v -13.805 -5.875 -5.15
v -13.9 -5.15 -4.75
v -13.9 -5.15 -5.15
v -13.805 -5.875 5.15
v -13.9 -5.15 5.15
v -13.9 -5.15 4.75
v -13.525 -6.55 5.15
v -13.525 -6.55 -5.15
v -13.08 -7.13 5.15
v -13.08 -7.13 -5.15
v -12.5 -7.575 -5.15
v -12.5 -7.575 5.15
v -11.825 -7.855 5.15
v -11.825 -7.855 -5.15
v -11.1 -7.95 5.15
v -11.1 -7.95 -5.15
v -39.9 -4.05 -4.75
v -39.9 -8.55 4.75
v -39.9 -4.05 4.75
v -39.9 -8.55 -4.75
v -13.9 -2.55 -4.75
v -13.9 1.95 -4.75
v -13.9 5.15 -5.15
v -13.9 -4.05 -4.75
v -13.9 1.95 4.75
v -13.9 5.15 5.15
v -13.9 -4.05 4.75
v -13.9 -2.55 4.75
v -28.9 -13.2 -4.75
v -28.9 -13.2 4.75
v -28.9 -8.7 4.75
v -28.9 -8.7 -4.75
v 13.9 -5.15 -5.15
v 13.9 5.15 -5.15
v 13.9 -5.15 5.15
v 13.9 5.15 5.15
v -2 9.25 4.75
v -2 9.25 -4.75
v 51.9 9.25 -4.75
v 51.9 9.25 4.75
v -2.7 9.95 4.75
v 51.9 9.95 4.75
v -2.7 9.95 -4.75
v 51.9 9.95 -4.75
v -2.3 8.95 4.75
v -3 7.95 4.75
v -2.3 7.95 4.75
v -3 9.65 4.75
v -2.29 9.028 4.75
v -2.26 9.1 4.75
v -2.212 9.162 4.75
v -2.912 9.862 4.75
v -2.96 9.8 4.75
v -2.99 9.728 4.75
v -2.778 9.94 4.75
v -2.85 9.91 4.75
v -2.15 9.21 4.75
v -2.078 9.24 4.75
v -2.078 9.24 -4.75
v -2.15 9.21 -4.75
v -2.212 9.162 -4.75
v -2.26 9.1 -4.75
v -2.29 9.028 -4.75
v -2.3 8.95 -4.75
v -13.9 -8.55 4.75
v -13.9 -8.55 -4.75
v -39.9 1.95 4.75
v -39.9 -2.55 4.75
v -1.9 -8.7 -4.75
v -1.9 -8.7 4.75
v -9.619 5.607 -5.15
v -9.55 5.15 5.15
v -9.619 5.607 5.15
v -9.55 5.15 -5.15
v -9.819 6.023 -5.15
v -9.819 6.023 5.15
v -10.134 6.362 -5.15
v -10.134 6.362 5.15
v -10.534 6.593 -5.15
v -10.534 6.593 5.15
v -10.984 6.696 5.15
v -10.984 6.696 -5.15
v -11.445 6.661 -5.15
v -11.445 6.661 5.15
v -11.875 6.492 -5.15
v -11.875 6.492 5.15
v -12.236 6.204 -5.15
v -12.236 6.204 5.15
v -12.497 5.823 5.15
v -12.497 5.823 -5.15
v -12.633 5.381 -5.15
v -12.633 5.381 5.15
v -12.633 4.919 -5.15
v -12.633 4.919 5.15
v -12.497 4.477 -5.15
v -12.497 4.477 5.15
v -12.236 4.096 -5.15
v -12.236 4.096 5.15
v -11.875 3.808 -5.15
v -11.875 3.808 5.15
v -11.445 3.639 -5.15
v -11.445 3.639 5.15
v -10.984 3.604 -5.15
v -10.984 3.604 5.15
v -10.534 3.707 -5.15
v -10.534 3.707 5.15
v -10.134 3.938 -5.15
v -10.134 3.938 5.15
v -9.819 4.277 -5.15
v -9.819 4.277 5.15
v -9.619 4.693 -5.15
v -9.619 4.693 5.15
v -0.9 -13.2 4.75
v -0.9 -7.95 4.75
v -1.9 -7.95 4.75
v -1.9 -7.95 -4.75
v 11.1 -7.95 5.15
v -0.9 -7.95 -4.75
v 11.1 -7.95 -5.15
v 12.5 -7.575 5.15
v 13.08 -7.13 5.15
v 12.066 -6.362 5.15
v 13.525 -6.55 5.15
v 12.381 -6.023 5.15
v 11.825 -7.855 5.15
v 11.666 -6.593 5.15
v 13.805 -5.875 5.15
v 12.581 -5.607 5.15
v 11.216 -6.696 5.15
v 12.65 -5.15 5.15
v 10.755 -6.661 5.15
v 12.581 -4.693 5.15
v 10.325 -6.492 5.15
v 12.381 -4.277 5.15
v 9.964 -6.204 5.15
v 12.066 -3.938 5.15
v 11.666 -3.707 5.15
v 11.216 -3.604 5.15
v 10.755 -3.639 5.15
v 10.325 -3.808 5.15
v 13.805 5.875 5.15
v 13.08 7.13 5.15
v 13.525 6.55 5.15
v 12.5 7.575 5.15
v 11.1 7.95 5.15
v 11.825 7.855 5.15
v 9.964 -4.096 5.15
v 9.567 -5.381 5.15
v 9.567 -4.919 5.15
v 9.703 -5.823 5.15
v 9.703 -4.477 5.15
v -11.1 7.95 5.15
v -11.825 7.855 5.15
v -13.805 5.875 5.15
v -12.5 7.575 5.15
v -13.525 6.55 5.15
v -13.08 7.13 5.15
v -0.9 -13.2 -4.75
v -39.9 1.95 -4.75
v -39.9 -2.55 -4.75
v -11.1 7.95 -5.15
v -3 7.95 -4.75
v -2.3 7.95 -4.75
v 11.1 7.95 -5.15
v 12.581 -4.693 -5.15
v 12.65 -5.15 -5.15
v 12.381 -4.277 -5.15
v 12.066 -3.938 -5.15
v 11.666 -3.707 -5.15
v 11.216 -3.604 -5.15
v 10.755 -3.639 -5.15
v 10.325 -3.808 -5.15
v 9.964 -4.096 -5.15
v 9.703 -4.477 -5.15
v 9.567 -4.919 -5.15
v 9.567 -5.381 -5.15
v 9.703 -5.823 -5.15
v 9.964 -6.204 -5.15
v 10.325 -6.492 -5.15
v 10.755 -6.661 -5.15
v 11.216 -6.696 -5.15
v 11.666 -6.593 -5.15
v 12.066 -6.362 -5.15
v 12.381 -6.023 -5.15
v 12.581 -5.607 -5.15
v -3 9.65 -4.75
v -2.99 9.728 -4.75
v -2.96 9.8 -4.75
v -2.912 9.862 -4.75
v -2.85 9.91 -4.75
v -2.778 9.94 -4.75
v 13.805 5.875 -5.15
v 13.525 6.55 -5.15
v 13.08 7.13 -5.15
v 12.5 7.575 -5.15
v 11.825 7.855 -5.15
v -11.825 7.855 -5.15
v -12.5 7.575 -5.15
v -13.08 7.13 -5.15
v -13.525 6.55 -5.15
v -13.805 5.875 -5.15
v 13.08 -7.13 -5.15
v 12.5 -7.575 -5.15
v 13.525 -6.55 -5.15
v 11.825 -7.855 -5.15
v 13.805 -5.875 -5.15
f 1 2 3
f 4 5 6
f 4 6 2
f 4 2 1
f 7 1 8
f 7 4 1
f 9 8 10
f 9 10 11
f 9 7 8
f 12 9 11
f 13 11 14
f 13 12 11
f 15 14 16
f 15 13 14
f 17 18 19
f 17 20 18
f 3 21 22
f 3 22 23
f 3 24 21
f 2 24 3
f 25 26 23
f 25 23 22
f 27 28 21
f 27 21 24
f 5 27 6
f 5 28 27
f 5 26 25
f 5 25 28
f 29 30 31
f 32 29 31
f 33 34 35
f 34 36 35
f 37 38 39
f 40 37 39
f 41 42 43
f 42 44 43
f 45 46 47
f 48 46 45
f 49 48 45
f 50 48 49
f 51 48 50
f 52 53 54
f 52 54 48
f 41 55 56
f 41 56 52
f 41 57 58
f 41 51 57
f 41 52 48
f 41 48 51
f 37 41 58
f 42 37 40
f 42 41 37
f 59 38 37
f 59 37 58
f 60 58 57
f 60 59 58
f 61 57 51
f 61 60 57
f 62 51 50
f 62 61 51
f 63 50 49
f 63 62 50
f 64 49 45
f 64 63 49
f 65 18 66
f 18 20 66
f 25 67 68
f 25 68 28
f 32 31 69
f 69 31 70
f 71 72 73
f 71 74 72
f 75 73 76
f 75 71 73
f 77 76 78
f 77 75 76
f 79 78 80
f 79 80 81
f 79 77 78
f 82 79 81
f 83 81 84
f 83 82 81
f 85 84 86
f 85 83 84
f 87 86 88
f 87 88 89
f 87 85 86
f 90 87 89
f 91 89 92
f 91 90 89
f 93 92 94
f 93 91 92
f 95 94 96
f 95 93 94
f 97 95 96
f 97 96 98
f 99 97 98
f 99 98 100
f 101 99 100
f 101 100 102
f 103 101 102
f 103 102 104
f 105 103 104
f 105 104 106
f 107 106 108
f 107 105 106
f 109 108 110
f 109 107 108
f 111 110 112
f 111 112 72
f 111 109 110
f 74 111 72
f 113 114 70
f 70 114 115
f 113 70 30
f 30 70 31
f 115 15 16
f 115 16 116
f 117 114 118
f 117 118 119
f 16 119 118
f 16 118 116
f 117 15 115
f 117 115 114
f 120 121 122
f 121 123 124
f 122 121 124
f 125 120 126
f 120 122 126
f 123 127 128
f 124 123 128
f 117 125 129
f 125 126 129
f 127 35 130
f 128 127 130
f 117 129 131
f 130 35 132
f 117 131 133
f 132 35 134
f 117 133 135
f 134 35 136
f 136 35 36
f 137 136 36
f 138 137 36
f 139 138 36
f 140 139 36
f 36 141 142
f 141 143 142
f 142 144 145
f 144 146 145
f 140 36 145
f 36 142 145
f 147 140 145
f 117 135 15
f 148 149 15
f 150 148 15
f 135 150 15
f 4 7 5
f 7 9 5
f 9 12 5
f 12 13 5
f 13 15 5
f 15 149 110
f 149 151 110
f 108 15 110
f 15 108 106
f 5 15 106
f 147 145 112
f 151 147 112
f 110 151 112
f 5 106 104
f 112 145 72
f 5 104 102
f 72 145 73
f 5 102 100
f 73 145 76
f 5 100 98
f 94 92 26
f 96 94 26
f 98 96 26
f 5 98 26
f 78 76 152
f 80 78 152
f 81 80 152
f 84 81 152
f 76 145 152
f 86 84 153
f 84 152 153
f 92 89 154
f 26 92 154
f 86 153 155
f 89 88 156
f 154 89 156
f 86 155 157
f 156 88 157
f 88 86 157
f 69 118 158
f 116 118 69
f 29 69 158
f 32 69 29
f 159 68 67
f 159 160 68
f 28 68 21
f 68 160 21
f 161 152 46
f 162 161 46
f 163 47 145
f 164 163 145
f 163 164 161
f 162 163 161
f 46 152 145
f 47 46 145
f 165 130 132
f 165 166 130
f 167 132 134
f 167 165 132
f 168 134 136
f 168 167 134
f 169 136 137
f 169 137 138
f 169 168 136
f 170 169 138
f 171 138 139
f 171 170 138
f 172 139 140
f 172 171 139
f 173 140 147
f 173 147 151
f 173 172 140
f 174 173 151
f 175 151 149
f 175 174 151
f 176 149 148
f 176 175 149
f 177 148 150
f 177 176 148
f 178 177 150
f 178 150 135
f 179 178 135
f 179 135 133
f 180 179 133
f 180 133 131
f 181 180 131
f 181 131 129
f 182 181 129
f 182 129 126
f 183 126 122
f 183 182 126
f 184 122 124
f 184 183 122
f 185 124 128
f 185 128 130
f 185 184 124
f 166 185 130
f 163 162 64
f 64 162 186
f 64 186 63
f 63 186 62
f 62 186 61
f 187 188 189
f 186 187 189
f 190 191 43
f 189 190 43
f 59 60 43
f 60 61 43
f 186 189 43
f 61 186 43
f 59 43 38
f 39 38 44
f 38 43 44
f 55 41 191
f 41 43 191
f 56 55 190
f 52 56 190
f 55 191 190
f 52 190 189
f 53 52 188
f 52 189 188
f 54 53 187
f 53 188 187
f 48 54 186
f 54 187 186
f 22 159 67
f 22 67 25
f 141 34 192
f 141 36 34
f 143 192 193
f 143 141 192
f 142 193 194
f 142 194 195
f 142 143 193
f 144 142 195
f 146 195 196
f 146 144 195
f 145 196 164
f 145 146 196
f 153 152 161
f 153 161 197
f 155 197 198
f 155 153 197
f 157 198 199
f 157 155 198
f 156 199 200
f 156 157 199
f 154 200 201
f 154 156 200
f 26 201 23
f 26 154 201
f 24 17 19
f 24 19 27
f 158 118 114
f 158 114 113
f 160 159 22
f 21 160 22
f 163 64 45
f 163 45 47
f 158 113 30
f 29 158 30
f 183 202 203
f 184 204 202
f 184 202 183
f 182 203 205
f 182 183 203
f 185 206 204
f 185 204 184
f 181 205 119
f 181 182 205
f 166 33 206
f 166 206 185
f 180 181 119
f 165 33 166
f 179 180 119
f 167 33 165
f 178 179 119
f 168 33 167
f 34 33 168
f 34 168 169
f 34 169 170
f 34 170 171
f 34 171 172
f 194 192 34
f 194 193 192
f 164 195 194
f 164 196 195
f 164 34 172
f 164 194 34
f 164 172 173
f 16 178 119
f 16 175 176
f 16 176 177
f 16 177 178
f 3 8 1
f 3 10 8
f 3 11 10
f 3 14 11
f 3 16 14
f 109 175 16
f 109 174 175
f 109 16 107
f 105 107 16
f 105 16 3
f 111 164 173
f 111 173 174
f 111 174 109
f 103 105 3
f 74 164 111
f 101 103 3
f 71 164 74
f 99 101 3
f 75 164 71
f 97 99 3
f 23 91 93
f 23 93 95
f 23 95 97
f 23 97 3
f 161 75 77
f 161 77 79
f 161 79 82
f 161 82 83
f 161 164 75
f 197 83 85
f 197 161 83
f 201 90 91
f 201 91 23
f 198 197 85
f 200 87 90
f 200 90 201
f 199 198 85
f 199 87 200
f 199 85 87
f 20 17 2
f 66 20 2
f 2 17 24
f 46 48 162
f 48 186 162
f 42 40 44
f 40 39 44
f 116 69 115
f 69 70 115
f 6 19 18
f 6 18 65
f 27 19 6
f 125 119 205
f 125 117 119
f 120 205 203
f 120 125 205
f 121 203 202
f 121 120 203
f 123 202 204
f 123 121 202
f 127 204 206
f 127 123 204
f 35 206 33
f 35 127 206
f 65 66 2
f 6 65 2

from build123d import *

# Parameters (mm, degrees)
SKETCH_R     = 1.55
PAD_DEPTH    = 5.15
SKETCH001_W  = 26
SKETCH001_H  = 4.5
PAD001_DEPTH = 4.75


with BuildPart() as part:
    # Sketch → Pad (new body, symmetric)
    with BuildSketch(Plane.XY):
        with BuildLine():
            Line((-11.1, 7.95), (11.1, 7.95))
            ThreePointArc((13.9, 5.15), (13.079899, 7.129899), (11.1, 7.95))
            Line((13.9, 5.15), (13.9, -5.15))
            ThreePointArc((11.1, -7.95), (13.079899, -7.129899), (13.9, -5.15))
            Line((-11.1, -7.95), (11.1, -7.95))
            ThreePointArc((-13.9, -5.15), (-13.079899, -7.129899), (-11.1, -7.95))
            Line((-13.9, 5.15), (-13.9, -5.15))
            ThreePointArc((-11.1, 7.95), (-13.079899, 7.129899), (-13.9, 5.15))
        make_face()
        with Locations((-11.1, 5.15)):
            Circle(SKETCH_R, mode=Mode.SUBTRACT)
        with Locations((11.1, -5.15)):
            Circle(SKETCH_R, mode=Mode.SUBTRACT)
    extrude(amount=PAD_DEPTH, both=True)

    # Sketch001 → Pad001 (join, symmetric)
    with BuildSketch(Plane.XY):
        with BuildLine():
            Line((-2, 9.25), (51.9, 9.25))
            Line((51.9, 9.25), (51.9, 9.95))
            Line((51.9, 9.95), (-2.7, 9.95))
            ThreePointArc((-2.7, 9.95), (-2.912132, 9.862132), (-3, 9.65))
            Line((-3, 9.65), (-3, 7.95))
            Line((-3, 7.95), (-2.3, 7.95))
            Line((-2.3, 8.95), (-2.3, 7.95))
            ThreePointArc((-2, 9.25), (-2.212132, 9.162132), (-2.3, 8.95))
        make_face()
        with Locations((-26.9, -0.3)):
            Rectangle(SKETCH001_W, SKETCH001_H)
        with Locations((-26.9, -6.3)):
            Rectangle(SKETCH001_W, SKETCH001_H)
        Polygon((-28.9, -8.7), (-1.9, -8.7), (-1.9, -7.95), (-0.9, -7.95), (-0.9, -13.2), (-28.9, -13.2), align=None)
    extrude(amount=PAD001_DEPTH, both=True)


solid = part.part
